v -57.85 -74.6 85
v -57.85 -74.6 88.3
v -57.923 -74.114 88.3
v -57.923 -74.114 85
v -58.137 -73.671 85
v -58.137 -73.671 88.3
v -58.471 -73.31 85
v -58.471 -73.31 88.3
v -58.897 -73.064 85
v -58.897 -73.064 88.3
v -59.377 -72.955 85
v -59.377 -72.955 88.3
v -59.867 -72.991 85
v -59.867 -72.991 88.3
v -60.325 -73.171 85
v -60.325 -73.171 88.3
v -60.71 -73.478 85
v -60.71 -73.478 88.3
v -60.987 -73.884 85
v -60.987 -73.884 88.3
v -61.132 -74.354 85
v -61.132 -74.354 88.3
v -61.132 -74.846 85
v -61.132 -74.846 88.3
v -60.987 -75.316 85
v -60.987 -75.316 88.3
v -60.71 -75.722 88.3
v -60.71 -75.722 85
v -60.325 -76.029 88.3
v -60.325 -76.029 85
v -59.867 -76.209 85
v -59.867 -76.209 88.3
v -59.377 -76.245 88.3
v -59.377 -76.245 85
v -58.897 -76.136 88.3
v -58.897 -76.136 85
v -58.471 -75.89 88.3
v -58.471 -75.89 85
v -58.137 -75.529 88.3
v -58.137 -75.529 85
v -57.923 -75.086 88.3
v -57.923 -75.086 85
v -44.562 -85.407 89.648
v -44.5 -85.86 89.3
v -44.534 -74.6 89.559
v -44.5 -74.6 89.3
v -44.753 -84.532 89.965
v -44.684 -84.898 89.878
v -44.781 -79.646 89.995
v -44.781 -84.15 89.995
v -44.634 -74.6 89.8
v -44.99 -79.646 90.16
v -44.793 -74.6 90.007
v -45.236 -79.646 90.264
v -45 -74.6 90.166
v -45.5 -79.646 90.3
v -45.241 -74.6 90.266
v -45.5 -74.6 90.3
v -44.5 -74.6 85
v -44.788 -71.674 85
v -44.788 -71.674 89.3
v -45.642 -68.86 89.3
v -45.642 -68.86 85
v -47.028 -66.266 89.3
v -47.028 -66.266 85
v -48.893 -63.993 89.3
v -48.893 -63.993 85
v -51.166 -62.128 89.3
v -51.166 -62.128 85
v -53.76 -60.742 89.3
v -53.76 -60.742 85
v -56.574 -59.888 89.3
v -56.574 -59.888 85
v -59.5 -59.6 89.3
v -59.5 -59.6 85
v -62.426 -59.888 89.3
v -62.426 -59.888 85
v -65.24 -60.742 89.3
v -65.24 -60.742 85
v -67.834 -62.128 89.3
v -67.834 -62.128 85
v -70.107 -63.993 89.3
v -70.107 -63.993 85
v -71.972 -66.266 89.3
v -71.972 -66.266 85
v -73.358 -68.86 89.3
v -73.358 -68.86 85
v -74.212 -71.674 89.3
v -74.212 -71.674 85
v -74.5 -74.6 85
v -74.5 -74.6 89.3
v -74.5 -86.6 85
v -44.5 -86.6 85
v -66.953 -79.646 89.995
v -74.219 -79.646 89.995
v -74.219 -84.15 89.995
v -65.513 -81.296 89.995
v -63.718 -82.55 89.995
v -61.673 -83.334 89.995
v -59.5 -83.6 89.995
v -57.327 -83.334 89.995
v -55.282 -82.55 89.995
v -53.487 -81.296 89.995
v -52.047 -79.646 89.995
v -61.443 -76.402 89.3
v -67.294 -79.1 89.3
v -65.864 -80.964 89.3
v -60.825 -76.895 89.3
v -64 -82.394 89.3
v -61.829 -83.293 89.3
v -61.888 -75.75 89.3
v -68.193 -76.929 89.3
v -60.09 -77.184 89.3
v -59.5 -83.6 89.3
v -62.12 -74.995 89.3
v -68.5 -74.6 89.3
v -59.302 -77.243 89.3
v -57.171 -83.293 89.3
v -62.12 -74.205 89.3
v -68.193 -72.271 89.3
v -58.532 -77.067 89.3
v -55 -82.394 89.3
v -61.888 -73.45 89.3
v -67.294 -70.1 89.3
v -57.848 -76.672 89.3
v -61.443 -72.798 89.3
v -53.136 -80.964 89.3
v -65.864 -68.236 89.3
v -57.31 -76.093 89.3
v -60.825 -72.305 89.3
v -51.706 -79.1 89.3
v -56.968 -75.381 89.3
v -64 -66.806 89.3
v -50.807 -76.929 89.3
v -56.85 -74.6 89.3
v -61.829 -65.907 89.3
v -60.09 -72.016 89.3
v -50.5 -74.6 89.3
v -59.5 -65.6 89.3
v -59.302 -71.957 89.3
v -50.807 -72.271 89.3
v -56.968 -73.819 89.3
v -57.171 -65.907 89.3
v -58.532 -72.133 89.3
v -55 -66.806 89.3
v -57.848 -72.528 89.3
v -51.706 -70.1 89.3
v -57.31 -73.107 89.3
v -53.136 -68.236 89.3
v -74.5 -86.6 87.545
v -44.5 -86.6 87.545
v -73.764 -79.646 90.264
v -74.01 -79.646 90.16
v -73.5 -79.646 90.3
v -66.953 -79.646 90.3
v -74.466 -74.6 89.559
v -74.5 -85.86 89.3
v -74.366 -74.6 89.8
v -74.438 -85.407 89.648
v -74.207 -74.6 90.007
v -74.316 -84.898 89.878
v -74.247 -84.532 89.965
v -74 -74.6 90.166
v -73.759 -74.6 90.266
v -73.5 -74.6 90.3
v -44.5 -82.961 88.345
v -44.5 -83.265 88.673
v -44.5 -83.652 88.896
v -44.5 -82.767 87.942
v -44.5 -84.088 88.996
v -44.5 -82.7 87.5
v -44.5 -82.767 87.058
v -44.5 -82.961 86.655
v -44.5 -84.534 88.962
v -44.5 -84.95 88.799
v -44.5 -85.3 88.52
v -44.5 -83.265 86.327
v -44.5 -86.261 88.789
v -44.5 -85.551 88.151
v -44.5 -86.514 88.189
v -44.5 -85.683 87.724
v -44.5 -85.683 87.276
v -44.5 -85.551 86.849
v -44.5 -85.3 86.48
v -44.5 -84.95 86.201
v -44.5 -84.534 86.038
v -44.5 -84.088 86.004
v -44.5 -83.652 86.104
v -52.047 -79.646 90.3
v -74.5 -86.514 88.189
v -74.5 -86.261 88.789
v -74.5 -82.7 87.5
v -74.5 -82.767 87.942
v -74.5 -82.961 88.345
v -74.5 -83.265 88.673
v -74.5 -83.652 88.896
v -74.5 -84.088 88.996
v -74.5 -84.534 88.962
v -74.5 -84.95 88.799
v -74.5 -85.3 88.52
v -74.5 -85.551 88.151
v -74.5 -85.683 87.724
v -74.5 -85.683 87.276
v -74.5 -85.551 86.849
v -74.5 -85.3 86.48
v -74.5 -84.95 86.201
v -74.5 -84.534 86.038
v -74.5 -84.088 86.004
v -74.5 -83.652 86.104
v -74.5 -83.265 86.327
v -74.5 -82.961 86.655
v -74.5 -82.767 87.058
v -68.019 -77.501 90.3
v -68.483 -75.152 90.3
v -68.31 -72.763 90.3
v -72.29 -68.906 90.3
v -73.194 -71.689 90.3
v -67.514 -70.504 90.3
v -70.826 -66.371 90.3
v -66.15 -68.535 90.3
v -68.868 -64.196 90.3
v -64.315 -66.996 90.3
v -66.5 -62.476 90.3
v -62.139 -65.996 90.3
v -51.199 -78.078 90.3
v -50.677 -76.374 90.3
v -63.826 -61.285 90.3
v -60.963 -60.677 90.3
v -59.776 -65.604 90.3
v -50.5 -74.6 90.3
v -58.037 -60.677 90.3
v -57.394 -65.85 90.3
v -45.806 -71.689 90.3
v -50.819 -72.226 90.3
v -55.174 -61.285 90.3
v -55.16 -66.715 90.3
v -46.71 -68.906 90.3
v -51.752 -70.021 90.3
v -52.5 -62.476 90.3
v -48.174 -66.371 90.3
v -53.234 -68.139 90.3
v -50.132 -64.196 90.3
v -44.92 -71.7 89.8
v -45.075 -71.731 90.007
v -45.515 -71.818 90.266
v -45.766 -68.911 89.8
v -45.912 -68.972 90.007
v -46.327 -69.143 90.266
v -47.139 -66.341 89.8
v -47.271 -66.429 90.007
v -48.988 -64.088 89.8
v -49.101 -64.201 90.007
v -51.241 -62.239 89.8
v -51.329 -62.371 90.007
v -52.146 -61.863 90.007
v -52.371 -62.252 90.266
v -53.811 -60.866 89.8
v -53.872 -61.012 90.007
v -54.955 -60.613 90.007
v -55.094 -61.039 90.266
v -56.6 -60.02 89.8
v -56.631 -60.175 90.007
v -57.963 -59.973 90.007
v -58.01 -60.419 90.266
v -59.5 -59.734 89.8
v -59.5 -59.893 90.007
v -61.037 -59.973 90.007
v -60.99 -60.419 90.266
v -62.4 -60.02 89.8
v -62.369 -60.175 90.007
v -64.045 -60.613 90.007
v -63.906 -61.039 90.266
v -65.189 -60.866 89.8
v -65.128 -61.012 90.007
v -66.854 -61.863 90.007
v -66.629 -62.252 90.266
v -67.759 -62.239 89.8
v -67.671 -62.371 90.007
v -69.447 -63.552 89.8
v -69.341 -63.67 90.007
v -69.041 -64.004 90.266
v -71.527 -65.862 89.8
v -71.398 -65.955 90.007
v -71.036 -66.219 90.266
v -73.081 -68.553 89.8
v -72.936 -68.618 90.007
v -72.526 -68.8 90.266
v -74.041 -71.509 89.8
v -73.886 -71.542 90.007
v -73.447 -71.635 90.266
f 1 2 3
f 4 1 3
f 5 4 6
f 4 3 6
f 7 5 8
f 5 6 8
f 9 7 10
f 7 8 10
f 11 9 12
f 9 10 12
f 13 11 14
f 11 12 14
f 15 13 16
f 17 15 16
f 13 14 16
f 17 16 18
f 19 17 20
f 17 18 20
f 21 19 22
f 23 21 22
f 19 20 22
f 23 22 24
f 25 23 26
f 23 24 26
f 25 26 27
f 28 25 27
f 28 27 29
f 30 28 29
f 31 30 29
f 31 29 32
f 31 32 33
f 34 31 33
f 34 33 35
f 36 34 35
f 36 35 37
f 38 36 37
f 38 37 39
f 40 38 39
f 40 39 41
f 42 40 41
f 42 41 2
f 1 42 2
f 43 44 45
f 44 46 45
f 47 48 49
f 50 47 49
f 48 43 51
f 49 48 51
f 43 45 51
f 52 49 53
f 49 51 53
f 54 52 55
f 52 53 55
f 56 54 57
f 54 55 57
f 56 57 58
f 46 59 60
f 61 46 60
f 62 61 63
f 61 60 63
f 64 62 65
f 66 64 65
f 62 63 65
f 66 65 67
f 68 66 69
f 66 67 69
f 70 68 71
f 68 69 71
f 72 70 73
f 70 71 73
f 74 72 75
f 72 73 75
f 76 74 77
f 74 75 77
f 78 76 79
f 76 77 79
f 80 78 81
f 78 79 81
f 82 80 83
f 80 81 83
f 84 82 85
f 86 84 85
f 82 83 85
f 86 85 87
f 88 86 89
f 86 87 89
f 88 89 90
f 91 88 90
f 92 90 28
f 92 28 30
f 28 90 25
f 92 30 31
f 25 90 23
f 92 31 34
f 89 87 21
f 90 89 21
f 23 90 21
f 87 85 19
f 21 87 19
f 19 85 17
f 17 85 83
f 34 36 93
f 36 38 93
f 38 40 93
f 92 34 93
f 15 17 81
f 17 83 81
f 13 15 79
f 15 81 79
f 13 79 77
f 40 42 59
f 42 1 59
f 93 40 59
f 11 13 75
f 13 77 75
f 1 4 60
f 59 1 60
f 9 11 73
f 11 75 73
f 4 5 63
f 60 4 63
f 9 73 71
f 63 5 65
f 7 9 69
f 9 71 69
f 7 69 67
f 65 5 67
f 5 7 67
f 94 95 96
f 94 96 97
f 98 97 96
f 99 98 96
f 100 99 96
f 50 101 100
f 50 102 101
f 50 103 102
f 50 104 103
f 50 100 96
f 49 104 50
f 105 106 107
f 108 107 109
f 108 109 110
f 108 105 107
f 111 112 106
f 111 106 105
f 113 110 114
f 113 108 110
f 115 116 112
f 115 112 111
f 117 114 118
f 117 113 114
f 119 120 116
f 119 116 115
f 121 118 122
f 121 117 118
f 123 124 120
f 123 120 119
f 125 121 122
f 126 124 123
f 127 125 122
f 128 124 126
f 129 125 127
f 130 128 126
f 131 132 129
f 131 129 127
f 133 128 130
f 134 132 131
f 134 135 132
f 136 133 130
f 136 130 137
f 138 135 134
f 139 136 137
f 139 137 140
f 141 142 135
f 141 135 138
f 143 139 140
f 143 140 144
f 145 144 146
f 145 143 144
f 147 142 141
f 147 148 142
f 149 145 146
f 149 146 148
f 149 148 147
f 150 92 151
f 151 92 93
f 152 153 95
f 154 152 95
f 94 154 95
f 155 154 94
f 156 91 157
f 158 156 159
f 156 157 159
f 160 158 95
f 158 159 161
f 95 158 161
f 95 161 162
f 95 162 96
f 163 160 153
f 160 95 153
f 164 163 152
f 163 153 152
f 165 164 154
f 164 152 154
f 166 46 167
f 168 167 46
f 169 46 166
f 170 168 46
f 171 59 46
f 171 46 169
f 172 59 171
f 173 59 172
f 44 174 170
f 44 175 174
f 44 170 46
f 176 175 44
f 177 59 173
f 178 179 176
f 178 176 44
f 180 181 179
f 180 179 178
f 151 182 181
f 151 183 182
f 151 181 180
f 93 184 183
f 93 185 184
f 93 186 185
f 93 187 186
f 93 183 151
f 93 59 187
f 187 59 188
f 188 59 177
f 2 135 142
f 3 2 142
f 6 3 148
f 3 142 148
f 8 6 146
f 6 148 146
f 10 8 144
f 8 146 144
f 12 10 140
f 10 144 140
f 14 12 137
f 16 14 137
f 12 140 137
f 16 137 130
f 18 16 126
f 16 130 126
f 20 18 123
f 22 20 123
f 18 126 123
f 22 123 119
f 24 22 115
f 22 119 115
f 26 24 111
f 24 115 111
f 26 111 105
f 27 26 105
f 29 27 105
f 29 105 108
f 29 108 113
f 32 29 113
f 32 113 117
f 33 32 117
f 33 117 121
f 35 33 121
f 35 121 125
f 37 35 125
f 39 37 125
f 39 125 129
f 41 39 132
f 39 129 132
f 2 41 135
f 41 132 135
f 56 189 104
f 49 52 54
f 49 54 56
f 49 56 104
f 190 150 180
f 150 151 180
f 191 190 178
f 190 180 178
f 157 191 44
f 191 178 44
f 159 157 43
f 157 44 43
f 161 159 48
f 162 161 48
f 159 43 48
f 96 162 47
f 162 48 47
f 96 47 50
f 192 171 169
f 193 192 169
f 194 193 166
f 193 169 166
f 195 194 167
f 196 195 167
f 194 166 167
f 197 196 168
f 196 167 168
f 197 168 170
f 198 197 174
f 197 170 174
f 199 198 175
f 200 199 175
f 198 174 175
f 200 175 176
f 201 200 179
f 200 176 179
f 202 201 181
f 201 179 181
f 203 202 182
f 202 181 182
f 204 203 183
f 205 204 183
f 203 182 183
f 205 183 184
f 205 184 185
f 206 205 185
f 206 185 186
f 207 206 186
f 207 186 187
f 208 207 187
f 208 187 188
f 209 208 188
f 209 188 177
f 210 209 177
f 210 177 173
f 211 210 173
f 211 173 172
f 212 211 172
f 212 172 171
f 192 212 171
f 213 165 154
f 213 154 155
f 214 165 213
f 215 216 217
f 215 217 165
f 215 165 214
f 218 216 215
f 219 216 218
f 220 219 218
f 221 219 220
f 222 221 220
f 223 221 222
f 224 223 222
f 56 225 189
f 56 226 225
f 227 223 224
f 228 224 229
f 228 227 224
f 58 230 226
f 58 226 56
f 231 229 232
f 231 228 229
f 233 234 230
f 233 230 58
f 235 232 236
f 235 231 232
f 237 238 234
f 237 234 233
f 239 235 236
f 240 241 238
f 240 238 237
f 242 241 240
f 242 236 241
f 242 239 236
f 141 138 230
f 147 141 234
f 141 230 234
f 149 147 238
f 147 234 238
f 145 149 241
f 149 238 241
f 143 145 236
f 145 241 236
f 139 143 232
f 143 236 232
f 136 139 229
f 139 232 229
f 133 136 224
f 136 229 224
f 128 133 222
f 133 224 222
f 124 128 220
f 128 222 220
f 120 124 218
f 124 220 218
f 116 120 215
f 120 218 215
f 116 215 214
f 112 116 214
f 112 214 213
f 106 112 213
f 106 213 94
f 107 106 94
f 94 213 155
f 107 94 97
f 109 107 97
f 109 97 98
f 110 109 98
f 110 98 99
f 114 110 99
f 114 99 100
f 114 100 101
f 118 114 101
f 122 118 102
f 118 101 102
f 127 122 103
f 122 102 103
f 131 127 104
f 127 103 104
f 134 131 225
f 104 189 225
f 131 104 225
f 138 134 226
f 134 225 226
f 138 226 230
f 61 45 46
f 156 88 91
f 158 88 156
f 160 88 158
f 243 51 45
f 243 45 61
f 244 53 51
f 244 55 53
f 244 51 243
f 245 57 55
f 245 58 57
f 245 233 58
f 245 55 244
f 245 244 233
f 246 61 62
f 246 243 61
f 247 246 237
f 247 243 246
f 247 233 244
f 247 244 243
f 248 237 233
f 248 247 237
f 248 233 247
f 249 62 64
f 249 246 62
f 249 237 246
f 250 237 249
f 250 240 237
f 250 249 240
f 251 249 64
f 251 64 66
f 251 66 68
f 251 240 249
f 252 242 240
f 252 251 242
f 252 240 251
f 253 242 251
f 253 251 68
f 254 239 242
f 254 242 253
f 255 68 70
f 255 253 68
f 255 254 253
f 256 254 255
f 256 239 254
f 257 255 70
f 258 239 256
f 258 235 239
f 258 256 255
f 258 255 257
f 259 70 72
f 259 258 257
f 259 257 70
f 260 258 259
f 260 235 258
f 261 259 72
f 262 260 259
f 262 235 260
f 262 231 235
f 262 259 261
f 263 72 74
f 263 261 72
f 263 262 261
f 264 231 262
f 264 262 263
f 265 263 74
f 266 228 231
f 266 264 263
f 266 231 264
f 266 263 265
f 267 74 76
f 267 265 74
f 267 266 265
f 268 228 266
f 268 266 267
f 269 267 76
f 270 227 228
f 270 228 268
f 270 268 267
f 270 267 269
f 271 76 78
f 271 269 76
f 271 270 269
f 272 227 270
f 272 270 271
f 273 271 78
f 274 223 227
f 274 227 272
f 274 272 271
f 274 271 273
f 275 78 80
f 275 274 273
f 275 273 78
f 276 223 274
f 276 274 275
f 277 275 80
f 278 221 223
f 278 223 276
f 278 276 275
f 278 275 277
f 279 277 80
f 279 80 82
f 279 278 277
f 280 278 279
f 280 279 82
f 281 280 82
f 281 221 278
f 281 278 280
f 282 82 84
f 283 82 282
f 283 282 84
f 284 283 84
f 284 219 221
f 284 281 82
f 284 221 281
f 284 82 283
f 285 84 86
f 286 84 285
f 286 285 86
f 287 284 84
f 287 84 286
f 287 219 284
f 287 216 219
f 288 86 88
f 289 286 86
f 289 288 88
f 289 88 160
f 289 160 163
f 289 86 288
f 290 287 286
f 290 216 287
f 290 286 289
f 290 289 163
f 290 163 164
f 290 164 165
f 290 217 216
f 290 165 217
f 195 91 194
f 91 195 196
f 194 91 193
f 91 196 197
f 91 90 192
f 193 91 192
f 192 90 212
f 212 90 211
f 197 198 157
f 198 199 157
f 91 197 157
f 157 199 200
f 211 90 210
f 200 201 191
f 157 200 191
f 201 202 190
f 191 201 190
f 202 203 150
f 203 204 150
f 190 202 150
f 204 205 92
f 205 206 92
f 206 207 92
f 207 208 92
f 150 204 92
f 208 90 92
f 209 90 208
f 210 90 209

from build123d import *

# Parameters (mm, degrees)
PAD011_DEPTH    = 5.3
SKETCH027_W     = 31.062653
SKETCH027_H     = 8.215561
POCKET012_DEPTH = 0.305
FILLET005_R     = 2.45
FILLET006_R     = 1
SKETCH028_R     = 9
POCKET013_DEPTH = 1
SKETCH029_R     = 1.65
POCKET014_DEPTH = 5
SKETCH030_R     = 1.5
POCKET015_DEPTH = 31
CHAMFER001_SIZE = 1


with BuildPart() as part:
    # Sketch026 → Pad011 (new body)
    with BuildSketch(Plane.XY):
        with BuildLine():
            ThreePointArc((15, 0), (0, 15), (-15, 0))
            Line((-15, 0), (-15, -12))
            Line((-15, -12), (15, -12))
            Line((15, 0), (15, -12))
        make_face()
    extrude(amount=PAD011_DEPTH)

    # Sketch027 (on Face6 of Pad011) → Pocket012 (cut)
    with BuildSketch(Plane.XY.offset(5.3)):
        with Locations((0.051316, -9.153541)):
            Rectangle(SKETCH027_W, SKETCH027_H)
    extrude(amount=-POCKET012_DEPTH, mode=Mode.SUBTRACT)

    # Fillet005
    fillet005_edges = [part.edges().sort_by_distance(p)[0] for p in [
        (0, -12, 4.995),
    ]]
    fillet(fillet005_edges, radius=FILLET005_R)

    # Fillet006
    fillet006_edges = [part.edges().sort_by_distance(p)[0] for p in [
        (0, 15, 5.3),
    ]]
    fillet(fillet006_edges, radius=FILLET006_R)

    # Sketch028 (on Face12 of Fillet006) → Pocket013 (cut)
    with BuildSketch(Plane.XY.offset(5.3)):
        Circle(SKETCH028_R)
    extrude(amount=-POCKET013_DEPTH, mode=Mode.SUBTRACT)

    # Sketch029 (on Face15 of Pocket013) → Pocket014 (cut)
    with BuildSketch(Plane.XY.offset(4.3)):
        Circle(SKETCH029_R)
    extrude(amount=-POCKET014_DEPTH, mode=Mode.SUBTRACT)

    # Sketch030 (on Face1 of Pocket014) → Pocket015 (cut)
    with BuildSketch(Plane.YZ.offset(15)):
        with Locations((-9.6, 2.5)):
            Circle(SKETCH030_R)
    extrude(amount=-POCKET015_DEPTH, mode=Mode.SUBTRACT)

    # Chamfer001
    chamfer001_edges = [part.edges().sort_by_distance(p)[0] for p in [
        (-1.65, 0, 4.3),
    ]]
    chamfer(chamfer001_edges, length=CHAMFER001_SIZE)


with BuildPart() as part_1:
    # Body007 placement: moved
    add(part.part.moved(Location((-59.5, -74.6, 85))))


solid = part_1.part
